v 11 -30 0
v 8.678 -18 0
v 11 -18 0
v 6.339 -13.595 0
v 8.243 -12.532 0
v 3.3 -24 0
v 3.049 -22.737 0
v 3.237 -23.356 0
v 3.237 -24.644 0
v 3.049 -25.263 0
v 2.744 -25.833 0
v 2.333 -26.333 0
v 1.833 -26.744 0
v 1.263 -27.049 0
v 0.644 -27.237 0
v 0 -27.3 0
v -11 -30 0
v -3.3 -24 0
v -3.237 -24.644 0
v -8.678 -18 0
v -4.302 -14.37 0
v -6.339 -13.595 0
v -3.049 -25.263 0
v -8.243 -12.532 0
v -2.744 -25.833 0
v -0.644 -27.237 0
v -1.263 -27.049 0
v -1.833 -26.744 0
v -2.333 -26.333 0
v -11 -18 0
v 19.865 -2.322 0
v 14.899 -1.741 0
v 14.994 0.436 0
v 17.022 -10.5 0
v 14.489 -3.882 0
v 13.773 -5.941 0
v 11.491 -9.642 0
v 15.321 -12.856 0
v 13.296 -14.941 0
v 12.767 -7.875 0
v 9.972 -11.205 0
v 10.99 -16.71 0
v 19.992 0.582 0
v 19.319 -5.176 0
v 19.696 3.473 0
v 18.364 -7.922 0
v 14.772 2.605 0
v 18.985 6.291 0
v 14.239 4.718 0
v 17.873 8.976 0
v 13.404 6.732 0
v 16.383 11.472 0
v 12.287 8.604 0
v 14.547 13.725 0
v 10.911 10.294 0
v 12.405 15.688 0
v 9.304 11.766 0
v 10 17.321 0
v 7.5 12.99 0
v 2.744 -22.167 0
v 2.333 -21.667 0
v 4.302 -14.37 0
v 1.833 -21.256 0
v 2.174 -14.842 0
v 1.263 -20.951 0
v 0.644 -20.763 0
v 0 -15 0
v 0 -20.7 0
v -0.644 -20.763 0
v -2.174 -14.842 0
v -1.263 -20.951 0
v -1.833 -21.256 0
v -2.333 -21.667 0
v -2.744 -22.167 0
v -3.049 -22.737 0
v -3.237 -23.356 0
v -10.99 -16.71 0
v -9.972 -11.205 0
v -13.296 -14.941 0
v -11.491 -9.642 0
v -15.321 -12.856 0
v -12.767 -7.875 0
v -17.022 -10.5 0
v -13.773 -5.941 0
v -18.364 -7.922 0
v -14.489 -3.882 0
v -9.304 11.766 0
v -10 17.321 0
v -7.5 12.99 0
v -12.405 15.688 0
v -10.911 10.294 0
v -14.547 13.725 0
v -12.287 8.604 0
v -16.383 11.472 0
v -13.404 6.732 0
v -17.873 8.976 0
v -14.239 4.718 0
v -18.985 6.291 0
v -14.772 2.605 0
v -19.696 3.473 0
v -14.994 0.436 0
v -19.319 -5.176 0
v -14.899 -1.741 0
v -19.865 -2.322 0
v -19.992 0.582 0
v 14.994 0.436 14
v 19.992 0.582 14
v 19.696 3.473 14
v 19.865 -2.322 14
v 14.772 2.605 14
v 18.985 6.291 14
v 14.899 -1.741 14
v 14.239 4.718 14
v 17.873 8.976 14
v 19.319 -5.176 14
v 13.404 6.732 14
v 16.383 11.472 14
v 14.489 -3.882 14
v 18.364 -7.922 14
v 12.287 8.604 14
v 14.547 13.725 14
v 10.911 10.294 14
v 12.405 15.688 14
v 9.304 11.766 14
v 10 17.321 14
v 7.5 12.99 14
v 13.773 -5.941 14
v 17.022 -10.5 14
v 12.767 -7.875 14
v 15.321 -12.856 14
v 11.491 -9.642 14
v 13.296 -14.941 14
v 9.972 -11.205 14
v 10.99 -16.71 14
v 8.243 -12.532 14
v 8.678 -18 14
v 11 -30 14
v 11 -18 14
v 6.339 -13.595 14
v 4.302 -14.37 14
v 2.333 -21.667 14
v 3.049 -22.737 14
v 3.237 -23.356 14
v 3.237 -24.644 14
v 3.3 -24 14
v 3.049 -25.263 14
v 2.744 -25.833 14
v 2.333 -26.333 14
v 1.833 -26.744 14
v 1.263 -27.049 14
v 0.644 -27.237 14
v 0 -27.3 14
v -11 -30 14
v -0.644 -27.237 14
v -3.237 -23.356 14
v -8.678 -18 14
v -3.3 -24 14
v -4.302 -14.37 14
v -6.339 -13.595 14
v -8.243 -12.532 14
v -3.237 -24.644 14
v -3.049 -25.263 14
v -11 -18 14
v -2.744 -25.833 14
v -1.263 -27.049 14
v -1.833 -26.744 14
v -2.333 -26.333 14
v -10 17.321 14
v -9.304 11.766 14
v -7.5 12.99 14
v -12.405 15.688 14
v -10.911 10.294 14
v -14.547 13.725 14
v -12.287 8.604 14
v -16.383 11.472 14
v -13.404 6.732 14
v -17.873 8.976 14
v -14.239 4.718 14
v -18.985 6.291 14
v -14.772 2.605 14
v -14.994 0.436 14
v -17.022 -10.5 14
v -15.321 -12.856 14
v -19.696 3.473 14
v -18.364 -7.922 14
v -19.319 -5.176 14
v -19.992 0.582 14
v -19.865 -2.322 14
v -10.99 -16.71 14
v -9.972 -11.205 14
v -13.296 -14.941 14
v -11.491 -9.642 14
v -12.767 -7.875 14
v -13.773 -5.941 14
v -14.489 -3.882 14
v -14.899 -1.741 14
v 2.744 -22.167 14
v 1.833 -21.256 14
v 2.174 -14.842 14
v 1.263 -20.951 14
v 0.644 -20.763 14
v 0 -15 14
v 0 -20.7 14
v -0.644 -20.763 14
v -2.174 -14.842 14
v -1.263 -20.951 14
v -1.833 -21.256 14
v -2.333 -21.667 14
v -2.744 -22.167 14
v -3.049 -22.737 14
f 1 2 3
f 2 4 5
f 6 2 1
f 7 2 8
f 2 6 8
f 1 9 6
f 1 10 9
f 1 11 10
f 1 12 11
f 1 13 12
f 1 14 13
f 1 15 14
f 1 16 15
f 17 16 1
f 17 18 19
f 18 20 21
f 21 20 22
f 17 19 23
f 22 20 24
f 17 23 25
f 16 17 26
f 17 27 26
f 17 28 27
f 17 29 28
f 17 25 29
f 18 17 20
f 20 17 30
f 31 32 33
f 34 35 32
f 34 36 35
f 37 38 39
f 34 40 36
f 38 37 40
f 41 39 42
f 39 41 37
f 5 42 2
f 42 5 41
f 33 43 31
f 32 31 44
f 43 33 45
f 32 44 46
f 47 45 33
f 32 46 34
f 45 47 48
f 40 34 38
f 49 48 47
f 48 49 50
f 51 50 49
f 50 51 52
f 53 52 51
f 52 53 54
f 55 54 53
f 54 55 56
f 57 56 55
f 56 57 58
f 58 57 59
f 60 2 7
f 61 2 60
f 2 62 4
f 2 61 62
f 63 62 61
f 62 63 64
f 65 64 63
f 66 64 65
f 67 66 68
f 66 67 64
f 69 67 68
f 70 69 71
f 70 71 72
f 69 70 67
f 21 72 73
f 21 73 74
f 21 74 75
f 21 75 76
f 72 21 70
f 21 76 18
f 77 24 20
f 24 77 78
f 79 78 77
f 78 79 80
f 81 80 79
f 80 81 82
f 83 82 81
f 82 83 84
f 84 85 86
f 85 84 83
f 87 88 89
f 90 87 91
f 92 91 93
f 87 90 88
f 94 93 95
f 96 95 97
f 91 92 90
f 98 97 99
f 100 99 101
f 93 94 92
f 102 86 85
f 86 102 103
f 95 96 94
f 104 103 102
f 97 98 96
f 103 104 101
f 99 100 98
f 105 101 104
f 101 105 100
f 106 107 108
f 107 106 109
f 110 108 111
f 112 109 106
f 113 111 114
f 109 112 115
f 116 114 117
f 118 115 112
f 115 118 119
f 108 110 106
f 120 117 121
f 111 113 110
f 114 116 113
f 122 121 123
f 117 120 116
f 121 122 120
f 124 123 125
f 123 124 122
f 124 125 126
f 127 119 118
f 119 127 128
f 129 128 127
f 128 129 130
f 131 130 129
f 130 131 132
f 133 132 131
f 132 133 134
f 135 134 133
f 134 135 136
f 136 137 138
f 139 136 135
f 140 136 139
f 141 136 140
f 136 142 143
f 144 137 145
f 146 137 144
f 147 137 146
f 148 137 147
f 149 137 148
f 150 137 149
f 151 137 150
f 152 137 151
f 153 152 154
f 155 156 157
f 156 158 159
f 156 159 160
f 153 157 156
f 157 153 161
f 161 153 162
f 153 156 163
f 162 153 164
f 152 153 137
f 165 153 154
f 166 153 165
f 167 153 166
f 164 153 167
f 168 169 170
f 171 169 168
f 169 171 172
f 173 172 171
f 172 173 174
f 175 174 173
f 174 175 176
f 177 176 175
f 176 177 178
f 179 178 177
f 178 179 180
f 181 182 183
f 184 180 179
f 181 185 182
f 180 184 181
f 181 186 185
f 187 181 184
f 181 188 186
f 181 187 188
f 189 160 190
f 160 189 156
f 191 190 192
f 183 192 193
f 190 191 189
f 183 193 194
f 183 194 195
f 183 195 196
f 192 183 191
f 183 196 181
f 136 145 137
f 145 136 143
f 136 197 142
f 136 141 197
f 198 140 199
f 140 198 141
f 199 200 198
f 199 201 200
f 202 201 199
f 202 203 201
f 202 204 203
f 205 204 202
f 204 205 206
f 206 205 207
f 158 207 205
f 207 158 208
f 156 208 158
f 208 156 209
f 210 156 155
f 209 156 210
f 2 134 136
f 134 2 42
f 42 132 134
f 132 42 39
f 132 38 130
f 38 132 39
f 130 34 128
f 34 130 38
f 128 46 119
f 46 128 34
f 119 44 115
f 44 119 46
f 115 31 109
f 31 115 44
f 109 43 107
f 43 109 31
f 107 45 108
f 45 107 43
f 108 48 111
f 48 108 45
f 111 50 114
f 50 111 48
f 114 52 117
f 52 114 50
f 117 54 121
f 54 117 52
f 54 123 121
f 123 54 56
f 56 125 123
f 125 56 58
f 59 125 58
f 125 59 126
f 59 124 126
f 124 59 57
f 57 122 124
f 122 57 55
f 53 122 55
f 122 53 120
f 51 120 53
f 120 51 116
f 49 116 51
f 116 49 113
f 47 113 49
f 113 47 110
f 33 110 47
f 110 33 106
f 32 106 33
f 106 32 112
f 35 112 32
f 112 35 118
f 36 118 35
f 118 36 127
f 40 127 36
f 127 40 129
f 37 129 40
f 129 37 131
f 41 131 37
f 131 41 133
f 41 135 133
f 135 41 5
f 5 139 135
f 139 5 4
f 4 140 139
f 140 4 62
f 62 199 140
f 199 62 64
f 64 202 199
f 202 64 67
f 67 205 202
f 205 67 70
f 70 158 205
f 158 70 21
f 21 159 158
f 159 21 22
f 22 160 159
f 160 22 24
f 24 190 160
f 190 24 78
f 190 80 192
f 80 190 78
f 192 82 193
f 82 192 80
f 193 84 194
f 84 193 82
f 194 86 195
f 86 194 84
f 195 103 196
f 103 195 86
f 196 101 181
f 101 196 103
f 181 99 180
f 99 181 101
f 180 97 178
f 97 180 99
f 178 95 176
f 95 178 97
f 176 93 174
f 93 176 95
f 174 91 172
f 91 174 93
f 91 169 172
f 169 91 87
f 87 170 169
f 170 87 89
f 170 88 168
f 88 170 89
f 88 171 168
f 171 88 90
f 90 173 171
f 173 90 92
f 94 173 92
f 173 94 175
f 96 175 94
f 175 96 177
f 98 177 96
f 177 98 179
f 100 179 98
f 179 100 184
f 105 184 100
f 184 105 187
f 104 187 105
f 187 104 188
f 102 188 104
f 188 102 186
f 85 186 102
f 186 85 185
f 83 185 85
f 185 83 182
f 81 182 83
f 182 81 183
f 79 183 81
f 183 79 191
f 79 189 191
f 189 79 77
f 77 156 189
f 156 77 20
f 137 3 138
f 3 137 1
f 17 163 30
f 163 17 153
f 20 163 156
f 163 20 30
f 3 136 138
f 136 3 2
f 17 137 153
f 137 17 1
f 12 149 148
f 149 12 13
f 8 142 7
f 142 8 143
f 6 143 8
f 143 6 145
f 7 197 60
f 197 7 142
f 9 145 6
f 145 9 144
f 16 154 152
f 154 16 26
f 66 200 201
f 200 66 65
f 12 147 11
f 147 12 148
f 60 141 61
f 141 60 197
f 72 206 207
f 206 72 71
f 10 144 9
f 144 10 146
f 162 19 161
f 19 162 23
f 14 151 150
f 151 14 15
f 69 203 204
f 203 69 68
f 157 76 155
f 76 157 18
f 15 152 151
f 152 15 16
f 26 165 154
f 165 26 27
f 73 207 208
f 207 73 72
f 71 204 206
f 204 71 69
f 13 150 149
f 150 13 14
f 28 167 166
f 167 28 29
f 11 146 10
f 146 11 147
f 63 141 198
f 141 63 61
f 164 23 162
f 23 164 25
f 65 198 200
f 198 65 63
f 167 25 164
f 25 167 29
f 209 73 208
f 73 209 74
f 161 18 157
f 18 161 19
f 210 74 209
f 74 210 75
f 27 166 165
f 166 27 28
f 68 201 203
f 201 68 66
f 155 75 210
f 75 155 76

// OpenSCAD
$fn = 32;

// ----------------------------------------------------------------------
// Spring clip: 40 mm outside, 5 mm band, 60 degree opening
// ----------------------------------------------------------------------

// --- parameters (mm) ---
outer_r = 20;             // clip outside radius
inner_r = 15;             // clip bore radius
band = 5;                 // band thickness
clip_w = 14;              // clip width
opening = 60;             // opening angle
tab_w = 22;               // tab width
tab_len = 10;             // tab length past the clip
tab_hole = 6.6;           // tab fixing hole

clip_profile = [[-10, 17.321], [-12.405, 15.688], [-14.547, 13.725], [-16.383, 11.472], [-17.873, 8.976], [-18.985, 6.291], [-19.696, 3.473], [-19.992, 0.582], [-19.865, -2.322], [-19.319, -5.176], [-18.364, -7.922], [-17.022, -10.5], [-15.321, -12.856], [-13.296, -14.941], [-10.99, -16.71], [-8.452, -18.126], [-5.736, -19.16], [-2.899, -19.789], [0, -20], [2.899, -19.789], [5.736, -19.16], [8.452, -18.126], [10.99, -16.71], [13.296, -14.941], [15.321, -12.856], [17.022, -10.5], [18.364, -7.922], [19.319, -5.176], [19.865, -2.322], [19.992, 0.582], [19.696, 3.473], [18.985, 6.291], [17.873, 8.976], [16.383, 11.472], [14.547, 13.725], [12.405, 15.688], [10, 17.321], [7.5, 12.99], [9.304, 11.766], [10.911, 10.294], [12.287, 8.604], [13.404, 6.732], [14.239, 4.718], [14.772, 2.605], [14.994, 0.436], [14.899, -1.741], [14.489, -3.882], [13.773, -5.941], [12.767, -7.875], [11.491, -9.642], [9.972, -11.205], [8.243, -12.532], [6.339, -13.595], [4.302, -14.37], [2.174, -14.842], [0, -15], [-2.174, -14.842], [-4.302, -14.37], [-6.339, -13.595], [-8.243, -12.532], [-9.972, -11.205], [-11.491, -9.642], [-12.767, -7.875], [-13.773, -5.941], [-14.489, -3.882], [-14.899, -1.741], [-14.994, 0.436], [-14.772, 2.605], [-14.239, 4.718], [-13.404, 6.732], [-12.287, 8.604], [-10.911, 10.294], [-9.304, 11.766], [-7.5, 12.99]];

difference() {
  union() {
    linear_extrude(height = clip_w) polygon(clip_profile);
    /* mounting tab, sunk 2 mm into the band */
    translate([-11, -30, 0]) cube([tab_w, 12, clip_w]);
  }
  translate([0, -24, -2.5]) cylinder(h = clip_w + 5, d = tab_hole);
}
